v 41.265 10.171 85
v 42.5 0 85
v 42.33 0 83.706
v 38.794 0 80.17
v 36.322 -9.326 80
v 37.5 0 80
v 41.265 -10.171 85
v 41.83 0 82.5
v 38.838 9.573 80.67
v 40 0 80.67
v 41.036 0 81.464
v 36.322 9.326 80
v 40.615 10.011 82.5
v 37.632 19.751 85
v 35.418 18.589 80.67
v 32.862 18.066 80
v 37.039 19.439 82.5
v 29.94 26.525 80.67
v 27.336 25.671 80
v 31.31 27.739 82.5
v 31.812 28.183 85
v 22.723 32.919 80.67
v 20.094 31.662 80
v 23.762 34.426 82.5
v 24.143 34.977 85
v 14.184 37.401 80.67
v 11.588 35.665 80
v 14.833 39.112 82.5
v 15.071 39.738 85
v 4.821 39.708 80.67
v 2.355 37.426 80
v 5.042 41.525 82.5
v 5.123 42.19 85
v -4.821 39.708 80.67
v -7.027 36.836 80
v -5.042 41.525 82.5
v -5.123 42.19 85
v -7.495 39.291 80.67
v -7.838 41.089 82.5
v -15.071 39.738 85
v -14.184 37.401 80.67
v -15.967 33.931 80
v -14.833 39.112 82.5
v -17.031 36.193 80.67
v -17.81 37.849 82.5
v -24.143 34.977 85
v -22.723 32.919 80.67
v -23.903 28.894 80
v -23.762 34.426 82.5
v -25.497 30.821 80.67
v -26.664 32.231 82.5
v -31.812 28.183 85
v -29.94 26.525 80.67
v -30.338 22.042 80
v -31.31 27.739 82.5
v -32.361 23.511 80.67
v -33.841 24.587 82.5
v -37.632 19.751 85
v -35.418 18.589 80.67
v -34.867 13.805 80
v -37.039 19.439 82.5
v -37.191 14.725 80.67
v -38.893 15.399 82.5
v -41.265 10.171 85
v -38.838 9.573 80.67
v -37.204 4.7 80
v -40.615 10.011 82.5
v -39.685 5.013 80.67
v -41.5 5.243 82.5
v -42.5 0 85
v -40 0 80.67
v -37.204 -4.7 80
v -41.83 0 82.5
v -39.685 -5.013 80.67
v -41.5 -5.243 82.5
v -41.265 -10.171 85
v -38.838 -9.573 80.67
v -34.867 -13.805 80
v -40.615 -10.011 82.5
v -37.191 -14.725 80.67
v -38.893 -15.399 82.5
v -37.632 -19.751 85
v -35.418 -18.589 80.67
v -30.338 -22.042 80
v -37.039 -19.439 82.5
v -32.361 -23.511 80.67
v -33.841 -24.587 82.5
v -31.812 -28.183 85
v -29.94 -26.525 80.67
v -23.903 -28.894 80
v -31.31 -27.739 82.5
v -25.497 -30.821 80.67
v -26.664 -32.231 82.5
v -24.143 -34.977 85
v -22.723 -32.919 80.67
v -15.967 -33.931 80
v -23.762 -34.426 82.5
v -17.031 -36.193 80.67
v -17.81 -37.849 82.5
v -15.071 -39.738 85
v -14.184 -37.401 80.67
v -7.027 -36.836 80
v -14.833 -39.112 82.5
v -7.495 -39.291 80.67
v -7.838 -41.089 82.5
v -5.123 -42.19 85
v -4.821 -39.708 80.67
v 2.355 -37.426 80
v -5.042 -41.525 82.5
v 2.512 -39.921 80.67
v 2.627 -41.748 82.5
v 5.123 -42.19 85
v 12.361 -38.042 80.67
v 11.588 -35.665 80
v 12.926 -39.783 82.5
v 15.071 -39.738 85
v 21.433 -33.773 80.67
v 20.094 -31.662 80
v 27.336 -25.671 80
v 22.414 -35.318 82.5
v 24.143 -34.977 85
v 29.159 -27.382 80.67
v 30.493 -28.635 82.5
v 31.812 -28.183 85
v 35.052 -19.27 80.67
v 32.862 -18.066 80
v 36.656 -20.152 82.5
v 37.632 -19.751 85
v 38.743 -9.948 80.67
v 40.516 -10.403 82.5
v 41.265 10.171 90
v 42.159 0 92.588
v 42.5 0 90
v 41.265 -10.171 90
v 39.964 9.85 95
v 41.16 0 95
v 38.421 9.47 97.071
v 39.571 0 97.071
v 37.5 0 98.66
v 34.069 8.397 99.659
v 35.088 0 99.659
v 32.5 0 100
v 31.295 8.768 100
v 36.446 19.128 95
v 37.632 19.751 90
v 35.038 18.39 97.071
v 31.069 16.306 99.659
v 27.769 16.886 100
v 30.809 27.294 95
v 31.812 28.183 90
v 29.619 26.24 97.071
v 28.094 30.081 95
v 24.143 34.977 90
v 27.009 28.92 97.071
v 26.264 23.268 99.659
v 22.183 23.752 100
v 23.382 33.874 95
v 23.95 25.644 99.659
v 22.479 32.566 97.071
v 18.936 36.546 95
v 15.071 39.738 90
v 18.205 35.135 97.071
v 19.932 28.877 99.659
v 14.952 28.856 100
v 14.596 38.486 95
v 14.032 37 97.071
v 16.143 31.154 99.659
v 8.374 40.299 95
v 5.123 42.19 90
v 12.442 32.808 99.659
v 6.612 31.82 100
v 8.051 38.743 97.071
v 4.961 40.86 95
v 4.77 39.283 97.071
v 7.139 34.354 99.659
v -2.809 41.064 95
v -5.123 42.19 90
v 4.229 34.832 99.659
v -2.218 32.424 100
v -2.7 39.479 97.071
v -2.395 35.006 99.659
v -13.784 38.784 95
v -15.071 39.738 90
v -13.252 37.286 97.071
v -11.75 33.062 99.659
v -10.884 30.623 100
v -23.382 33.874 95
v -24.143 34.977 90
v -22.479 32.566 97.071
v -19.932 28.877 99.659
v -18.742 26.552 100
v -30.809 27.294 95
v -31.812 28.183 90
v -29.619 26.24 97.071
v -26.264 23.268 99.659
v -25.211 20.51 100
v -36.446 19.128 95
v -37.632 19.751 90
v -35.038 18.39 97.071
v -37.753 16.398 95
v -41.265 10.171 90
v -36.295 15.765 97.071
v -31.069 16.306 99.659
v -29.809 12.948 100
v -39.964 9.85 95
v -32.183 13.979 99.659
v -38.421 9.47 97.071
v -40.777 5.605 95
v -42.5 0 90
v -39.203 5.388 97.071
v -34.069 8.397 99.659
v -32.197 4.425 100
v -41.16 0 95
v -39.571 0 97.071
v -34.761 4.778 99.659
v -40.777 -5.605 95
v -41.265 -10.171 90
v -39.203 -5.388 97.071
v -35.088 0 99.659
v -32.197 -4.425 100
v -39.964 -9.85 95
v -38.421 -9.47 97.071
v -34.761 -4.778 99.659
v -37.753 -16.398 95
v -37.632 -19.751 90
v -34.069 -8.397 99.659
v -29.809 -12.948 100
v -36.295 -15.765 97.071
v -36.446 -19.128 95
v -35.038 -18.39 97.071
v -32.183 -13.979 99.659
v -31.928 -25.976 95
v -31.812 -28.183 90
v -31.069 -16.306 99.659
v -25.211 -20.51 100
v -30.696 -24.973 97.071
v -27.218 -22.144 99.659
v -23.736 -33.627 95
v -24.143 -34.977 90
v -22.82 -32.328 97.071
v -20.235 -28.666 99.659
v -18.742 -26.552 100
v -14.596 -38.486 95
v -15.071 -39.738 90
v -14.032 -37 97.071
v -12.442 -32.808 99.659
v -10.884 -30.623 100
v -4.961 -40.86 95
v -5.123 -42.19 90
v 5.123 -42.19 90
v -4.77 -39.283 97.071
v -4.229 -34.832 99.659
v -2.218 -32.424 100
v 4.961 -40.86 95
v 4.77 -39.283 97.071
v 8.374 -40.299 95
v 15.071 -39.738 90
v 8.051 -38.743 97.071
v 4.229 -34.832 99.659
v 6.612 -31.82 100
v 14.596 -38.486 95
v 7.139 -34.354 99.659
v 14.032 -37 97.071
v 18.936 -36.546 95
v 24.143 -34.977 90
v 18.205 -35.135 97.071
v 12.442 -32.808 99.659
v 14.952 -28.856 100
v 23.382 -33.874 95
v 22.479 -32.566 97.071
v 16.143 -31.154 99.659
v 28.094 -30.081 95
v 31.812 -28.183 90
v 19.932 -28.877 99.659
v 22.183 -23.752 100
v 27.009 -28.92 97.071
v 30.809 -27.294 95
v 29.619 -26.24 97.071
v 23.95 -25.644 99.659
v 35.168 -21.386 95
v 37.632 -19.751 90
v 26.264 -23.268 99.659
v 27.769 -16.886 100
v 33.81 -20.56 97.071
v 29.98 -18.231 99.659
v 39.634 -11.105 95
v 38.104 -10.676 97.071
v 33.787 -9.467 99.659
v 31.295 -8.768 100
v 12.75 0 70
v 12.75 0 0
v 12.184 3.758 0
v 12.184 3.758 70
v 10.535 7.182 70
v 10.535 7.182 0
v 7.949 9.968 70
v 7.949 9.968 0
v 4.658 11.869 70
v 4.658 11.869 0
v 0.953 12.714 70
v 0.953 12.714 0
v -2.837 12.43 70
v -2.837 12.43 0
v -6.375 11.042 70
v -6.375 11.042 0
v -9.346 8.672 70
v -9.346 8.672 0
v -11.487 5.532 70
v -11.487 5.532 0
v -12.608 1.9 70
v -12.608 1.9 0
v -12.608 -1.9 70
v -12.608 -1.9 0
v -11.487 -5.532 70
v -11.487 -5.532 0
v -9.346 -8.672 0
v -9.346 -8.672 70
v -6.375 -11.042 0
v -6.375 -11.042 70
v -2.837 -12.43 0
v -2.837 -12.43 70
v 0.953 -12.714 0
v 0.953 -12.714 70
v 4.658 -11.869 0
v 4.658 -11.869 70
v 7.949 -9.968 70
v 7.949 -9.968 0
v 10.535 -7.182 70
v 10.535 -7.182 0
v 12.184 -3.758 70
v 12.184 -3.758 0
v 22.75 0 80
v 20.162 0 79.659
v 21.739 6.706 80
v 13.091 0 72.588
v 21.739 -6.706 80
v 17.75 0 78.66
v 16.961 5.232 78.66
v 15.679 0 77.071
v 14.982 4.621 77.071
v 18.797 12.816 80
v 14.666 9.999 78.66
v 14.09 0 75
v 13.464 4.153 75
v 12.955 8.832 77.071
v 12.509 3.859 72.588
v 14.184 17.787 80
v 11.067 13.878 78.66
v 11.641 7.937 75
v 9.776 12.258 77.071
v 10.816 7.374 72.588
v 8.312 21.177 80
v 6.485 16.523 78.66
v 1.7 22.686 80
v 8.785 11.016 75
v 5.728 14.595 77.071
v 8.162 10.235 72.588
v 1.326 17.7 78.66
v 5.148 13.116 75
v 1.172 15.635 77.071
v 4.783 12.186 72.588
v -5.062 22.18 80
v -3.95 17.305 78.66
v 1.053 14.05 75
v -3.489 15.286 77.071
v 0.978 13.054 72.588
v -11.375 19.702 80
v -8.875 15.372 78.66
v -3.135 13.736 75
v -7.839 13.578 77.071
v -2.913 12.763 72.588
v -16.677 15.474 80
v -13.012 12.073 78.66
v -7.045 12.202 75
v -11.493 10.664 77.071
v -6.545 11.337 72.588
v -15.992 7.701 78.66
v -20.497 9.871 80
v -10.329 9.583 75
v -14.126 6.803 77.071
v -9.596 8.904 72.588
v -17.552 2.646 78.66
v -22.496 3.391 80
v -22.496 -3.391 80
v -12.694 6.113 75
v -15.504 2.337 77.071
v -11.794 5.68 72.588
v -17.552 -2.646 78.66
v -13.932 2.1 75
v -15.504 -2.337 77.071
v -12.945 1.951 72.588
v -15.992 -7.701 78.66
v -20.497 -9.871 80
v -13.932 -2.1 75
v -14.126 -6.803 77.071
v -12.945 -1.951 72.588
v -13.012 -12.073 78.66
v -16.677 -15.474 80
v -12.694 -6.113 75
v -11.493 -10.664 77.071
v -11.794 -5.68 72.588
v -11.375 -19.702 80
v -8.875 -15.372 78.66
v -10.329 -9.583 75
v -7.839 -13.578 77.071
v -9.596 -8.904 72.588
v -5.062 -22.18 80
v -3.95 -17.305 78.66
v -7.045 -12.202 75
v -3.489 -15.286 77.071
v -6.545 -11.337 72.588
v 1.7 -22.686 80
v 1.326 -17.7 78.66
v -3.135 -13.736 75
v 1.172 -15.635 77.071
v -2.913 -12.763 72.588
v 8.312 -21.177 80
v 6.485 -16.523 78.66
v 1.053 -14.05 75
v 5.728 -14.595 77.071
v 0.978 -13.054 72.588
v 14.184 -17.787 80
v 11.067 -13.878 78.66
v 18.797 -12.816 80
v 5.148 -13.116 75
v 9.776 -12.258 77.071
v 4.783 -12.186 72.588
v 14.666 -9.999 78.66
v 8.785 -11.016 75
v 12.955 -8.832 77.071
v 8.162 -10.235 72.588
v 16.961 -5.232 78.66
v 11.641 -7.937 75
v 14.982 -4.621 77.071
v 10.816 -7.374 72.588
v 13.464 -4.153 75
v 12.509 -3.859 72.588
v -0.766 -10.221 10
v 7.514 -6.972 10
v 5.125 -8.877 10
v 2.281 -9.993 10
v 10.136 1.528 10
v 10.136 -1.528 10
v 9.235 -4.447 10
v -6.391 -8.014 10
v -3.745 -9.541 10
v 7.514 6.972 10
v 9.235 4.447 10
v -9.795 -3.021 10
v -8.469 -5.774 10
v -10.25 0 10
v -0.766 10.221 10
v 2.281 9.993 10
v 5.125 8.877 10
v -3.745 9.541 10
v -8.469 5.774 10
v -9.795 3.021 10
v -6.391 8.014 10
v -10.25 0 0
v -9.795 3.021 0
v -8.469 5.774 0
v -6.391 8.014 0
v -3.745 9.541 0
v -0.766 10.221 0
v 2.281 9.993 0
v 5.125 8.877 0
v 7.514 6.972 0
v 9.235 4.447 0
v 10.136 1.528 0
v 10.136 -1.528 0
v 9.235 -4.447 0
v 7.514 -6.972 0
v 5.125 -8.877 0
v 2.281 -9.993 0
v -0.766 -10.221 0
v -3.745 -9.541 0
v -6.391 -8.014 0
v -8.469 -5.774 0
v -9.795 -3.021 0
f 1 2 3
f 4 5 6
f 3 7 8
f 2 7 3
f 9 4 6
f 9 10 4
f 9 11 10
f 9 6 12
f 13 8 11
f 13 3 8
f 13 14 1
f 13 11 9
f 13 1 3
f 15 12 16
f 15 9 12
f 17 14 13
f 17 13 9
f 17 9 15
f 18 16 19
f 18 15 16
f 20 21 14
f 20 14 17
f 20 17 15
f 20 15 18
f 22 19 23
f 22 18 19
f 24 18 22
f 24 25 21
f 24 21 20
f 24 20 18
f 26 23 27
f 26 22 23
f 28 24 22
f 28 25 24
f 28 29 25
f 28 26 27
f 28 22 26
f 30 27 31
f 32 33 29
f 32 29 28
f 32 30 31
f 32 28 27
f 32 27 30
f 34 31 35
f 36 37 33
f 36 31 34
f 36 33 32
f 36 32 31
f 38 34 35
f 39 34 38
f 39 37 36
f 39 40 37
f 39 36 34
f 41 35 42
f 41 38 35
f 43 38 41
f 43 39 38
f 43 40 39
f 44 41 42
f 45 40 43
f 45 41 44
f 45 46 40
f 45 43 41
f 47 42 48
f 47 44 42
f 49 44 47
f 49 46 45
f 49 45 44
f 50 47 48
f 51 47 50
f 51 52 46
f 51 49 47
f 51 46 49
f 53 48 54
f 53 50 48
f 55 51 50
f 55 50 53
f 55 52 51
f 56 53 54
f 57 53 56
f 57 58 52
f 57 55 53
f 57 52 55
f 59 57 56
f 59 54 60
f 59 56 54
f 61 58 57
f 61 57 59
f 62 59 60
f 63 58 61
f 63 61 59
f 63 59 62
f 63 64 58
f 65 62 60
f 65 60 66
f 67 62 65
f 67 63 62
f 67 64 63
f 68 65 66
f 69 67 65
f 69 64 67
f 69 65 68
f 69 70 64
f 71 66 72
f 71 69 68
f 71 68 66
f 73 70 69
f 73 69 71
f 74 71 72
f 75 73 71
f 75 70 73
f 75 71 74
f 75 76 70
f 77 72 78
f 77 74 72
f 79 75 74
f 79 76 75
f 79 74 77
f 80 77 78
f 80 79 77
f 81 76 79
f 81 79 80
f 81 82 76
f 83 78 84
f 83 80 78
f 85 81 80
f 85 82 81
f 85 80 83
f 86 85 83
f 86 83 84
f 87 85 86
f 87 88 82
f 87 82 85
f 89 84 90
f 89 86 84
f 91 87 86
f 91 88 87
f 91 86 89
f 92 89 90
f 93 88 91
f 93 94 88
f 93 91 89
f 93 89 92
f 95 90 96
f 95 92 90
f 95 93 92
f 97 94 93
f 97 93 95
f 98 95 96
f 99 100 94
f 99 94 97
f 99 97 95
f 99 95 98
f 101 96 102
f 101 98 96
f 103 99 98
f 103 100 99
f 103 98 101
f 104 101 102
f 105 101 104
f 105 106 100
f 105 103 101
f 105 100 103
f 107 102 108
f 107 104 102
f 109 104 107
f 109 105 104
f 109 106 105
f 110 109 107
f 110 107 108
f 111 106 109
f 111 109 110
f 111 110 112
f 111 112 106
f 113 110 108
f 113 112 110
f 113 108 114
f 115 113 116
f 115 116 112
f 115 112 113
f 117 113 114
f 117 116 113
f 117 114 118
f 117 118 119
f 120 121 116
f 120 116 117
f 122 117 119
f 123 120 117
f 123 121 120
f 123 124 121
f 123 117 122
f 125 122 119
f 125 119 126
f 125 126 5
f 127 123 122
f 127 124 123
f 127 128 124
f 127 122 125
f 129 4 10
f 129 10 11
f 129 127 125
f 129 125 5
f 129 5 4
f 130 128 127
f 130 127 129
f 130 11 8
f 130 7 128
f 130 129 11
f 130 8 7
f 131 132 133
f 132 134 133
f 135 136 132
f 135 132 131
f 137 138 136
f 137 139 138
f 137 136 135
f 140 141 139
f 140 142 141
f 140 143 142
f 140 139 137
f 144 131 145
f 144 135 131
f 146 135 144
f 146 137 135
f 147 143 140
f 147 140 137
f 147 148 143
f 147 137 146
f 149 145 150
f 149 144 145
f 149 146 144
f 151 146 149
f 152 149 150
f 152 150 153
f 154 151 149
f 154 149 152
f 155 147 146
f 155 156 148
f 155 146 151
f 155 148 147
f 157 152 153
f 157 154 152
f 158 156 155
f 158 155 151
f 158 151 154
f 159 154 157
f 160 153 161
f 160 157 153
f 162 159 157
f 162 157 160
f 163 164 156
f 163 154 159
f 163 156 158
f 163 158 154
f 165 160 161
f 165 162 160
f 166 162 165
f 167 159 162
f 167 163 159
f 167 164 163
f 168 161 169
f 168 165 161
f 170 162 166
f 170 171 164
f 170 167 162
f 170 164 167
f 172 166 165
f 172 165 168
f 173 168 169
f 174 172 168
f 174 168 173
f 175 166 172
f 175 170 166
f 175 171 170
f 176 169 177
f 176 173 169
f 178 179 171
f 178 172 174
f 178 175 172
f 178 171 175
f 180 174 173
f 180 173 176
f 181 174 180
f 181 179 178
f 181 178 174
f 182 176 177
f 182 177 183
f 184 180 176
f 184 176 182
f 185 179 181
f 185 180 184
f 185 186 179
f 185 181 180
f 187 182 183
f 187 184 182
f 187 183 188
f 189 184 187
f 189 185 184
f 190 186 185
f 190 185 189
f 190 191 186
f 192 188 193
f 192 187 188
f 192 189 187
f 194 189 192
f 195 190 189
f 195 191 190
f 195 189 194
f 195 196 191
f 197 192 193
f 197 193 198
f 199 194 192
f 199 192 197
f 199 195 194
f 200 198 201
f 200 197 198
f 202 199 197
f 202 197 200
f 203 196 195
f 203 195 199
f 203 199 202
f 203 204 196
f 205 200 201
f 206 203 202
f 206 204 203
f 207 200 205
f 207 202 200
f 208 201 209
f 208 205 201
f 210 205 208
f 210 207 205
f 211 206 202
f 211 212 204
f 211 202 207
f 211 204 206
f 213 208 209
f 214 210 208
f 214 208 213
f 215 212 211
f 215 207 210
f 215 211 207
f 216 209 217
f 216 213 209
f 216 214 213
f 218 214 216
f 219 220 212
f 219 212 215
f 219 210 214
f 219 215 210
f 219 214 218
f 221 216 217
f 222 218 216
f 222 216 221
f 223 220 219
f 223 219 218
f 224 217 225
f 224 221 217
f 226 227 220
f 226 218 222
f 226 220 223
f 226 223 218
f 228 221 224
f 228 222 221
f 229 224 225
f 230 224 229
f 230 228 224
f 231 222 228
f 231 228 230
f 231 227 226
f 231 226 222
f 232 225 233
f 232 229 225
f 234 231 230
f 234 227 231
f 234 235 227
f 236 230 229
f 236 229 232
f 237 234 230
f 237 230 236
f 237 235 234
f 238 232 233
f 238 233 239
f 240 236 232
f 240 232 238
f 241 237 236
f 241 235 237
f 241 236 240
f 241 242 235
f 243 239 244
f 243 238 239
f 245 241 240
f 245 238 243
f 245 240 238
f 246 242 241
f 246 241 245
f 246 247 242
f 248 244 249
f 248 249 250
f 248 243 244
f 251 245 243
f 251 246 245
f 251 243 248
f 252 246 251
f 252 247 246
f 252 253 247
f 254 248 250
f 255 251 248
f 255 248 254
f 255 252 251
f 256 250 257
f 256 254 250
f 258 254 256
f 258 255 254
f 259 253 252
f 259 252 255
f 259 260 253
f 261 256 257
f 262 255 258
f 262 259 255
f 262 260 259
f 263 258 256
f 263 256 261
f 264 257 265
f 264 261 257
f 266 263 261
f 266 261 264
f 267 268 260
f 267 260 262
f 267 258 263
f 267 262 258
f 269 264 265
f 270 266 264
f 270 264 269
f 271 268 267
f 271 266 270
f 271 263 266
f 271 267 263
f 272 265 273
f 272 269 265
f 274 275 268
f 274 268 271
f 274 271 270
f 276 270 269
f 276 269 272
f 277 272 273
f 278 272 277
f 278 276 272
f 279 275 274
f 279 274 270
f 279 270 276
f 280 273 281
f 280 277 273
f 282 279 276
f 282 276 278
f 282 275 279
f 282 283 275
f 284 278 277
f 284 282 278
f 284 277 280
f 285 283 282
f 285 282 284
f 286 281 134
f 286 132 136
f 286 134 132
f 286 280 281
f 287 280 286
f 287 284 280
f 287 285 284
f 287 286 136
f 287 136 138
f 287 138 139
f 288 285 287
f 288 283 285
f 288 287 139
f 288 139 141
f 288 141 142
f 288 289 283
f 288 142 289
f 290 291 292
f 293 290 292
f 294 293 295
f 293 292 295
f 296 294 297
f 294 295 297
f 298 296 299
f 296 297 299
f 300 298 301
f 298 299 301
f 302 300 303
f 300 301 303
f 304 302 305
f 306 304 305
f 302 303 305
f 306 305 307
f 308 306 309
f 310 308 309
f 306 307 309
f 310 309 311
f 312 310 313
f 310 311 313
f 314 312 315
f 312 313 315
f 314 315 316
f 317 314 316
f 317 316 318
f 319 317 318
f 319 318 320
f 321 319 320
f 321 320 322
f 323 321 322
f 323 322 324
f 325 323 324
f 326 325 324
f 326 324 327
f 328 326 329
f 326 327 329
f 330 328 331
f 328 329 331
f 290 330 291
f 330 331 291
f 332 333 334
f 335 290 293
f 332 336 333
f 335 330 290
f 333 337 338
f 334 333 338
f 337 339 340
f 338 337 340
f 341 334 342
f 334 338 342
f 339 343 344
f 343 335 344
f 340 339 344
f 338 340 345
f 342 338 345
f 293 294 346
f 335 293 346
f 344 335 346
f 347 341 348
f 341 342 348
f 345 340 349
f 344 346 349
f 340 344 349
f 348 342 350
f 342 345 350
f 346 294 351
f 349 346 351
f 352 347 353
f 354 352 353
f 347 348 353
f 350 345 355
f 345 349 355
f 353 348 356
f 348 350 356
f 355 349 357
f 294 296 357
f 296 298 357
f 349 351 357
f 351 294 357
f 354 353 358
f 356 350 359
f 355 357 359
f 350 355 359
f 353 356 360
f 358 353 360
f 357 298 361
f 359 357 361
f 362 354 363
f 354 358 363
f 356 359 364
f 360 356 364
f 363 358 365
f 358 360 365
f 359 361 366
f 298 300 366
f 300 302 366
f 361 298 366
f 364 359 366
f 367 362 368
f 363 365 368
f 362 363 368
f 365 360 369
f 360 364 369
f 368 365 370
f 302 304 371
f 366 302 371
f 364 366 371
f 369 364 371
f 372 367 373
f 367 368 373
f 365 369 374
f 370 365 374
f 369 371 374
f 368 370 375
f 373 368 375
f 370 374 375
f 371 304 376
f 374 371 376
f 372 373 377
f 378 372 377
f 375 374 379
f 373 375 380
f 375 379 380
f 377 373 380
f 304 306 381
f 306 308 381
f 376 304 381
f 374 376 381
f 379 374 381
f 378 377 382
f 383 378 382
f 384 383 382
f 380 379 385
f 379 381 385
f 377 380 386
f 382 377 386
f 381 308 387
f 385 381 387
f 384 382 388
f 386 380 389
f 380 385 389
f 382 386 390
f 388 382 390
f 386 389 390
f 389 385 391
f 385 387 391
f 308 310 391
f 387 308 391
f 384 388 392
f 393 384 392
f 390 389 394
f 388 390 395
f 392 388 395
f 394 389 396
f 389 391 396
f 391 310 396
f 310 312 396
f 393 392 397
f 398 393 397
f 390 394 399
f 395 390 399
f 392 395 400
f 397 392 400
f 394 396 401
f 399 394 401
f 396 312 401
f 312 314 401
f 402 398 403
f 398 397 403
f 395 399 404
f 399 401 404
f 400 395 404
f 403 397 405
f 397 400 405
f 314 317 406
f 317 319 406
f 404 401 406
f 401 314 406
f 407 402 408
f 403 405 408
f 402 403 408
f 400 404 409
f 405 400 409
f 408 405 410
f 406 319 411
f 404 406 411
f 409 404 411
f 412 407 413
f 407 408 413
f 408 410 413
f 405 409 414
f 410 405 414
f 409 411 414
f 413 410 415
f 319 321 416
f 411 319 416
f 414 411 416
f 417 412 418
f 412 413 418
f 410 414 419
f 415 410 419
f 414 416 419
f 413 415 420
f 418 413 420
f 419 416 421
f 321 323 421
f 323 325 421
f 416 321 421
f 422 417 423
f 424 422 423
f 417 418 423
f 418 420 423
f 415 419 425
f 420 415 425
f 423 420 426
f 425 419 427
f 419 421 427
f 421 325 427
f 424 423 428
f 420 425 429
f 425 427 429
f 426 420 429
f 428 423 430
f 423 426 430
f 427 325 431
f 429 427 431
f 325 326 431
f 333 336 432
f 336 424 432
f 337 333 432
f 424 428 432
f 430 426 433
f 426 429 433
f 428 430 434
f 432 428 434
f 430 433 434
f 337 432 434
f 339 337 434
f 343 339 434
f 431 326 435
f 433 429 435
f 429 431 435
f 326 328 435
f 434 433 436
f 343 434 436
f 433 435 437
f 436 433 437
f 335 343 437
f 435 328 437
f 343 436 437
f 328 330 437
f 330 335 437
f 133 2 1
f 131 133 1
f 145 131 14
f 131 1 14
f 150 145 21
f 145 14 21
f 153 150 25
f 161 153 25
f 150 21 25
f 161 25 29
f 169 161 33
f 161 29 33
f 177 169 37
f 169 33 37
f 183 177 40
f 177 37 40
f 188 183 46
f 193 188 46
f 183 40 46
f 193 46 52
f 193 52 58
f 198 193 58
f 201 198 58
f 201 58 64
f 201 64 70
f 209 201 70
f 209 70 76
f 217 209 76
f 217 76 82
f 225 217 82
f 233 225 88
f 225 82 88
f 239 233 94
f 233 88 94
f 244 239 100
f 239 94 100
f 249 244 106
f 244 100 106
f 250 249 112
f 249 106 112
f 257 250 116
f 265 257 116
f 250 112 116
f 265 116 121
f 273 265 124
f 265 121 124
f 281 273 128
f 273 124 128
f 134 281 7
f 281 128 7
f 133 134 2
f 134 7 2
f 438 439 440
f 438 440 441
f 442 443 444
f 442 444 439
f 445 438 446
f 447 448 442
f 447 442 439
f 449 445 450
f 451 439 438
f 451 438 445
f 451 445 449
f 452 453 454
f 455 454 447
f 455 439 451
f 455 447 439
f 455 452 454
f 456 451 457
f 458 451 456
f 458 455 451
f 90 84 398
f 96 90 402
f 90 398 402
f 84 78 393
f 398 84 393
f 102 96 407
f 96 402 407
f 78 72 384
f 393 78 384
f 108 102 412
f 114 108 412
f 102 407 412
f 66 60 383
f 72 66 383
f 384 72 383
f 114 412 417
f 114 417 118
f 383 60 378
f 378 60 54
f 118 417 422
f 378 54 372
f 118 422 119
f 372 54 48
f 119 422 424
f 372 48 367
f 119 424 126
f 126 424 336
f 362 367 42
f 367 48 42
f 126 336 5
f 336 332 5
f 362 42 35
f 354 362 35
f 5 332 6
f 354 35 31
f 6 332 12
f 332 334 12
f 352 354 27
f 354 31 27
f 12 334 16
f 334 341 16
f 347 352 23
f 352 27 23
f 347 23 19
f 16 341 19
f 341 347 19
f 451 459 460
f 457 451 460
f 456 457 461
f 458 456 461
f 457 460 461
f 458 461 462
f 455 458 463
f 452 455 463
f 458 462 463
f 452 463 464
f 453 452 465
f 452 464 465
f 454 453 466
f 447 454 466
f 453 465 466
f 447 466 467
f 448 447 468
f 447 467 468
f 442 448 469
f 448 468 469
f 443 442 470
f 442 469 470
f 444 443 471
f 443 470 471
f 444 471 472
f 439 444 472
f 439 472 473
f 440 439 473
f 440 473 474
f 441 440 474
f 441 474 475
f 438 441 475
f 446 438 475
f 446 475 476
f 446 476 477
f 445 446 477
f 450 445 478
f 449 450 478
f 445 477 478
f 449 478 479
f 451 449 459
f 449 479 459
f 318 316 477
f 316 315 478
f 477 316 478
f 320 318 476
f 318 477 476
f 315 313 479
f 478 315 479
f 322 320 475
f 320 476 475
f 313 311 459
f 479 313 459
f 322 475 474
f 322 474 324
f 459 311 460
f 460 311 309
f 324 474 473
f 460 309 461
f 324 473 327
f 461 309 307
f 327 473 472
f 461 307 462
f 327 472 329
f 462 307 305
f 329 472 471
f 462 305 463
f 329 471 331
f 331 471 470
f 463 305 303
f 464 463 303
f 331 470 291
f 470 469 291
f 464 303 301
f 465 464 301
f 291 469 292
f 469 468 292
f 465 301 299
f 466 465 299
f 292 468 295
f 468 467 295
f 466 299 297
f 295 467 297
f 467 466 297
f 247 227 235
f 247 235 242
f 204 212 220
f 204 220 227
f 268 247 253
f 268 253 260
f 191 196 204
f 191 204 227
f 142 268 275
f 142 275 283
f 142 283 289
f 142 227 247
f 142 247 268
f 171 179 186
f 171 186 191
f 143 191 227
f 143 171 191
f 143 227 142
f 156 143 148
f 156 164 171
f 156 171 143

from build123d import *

# Parameters (mm, degrees)
CROQUIS1_R              = 12.75
SALIENTE_EXTRUIR1_DEPTH = 80
CROQUIS2_R              = 42.5
SALIENTE_EXTRUIR2_DEPTH = 20
REDONDEO1_R             = 10
CROQUIS3_R              = 10.25
CORTAR_EXTRUIR1_DEPTH   = 10
REDONDEO2_R             = 10
REDONDEO3_R             = 5


with BuildPart() as part:
    # Croquis1 → Saliente-Extruir1 (new body)
    with BuildSketch(Plane.XY):
        Circle(CROQUIS1_R)
    extrude(amount=SALIENTE_EXTRUIR1_DEPTH)

    # Croquis2 → Saliente-Extruir2 (add)
    with BuildSketch(Plane.XY.offset(80)):
        Circle(CROQUIS2_R)
    extrude(amount=SALIENTE_EXTRUIR2_DEPTH)

    # Redondeo1
    redondeo1_edges = [part.edges().sort_by_distance(p)[0] for p in [
        (-42.5, 0, 100),
    ]]
    fillet(redondeo1_edges, radius=REDONDEO1_R)

    # Croquis3 → Cortar-Extruir1 (cut)
    with BuildSketch(Plane(origin=(0, 0, 0), x_dir=(-1, 0, 0), z_dir=(0, 0, -1))):
        Circle(CROQUIS3_R)
    extrude(amount=-CORTAR_EXTRUIR1_DEPTH, mode=Mode.SUBTRACT)

    # Redondeo2
    redondeo2_edges = [part.edges().sort_by_distance(p)[0] for p in [
        (-12.75, 0, 80),
    ]]
    fillet(redondeo2_edges, radius=REDONDEO2_R)

    # Redondeo3
    redondeo3_edges = [part.edges().sort_by_distance(p)[0] for p in [
        (-42.5, 0, 80),
    ]]
    fillet(redondeo3_edges, radius=REDONDEO3_R)


solid = part.part
